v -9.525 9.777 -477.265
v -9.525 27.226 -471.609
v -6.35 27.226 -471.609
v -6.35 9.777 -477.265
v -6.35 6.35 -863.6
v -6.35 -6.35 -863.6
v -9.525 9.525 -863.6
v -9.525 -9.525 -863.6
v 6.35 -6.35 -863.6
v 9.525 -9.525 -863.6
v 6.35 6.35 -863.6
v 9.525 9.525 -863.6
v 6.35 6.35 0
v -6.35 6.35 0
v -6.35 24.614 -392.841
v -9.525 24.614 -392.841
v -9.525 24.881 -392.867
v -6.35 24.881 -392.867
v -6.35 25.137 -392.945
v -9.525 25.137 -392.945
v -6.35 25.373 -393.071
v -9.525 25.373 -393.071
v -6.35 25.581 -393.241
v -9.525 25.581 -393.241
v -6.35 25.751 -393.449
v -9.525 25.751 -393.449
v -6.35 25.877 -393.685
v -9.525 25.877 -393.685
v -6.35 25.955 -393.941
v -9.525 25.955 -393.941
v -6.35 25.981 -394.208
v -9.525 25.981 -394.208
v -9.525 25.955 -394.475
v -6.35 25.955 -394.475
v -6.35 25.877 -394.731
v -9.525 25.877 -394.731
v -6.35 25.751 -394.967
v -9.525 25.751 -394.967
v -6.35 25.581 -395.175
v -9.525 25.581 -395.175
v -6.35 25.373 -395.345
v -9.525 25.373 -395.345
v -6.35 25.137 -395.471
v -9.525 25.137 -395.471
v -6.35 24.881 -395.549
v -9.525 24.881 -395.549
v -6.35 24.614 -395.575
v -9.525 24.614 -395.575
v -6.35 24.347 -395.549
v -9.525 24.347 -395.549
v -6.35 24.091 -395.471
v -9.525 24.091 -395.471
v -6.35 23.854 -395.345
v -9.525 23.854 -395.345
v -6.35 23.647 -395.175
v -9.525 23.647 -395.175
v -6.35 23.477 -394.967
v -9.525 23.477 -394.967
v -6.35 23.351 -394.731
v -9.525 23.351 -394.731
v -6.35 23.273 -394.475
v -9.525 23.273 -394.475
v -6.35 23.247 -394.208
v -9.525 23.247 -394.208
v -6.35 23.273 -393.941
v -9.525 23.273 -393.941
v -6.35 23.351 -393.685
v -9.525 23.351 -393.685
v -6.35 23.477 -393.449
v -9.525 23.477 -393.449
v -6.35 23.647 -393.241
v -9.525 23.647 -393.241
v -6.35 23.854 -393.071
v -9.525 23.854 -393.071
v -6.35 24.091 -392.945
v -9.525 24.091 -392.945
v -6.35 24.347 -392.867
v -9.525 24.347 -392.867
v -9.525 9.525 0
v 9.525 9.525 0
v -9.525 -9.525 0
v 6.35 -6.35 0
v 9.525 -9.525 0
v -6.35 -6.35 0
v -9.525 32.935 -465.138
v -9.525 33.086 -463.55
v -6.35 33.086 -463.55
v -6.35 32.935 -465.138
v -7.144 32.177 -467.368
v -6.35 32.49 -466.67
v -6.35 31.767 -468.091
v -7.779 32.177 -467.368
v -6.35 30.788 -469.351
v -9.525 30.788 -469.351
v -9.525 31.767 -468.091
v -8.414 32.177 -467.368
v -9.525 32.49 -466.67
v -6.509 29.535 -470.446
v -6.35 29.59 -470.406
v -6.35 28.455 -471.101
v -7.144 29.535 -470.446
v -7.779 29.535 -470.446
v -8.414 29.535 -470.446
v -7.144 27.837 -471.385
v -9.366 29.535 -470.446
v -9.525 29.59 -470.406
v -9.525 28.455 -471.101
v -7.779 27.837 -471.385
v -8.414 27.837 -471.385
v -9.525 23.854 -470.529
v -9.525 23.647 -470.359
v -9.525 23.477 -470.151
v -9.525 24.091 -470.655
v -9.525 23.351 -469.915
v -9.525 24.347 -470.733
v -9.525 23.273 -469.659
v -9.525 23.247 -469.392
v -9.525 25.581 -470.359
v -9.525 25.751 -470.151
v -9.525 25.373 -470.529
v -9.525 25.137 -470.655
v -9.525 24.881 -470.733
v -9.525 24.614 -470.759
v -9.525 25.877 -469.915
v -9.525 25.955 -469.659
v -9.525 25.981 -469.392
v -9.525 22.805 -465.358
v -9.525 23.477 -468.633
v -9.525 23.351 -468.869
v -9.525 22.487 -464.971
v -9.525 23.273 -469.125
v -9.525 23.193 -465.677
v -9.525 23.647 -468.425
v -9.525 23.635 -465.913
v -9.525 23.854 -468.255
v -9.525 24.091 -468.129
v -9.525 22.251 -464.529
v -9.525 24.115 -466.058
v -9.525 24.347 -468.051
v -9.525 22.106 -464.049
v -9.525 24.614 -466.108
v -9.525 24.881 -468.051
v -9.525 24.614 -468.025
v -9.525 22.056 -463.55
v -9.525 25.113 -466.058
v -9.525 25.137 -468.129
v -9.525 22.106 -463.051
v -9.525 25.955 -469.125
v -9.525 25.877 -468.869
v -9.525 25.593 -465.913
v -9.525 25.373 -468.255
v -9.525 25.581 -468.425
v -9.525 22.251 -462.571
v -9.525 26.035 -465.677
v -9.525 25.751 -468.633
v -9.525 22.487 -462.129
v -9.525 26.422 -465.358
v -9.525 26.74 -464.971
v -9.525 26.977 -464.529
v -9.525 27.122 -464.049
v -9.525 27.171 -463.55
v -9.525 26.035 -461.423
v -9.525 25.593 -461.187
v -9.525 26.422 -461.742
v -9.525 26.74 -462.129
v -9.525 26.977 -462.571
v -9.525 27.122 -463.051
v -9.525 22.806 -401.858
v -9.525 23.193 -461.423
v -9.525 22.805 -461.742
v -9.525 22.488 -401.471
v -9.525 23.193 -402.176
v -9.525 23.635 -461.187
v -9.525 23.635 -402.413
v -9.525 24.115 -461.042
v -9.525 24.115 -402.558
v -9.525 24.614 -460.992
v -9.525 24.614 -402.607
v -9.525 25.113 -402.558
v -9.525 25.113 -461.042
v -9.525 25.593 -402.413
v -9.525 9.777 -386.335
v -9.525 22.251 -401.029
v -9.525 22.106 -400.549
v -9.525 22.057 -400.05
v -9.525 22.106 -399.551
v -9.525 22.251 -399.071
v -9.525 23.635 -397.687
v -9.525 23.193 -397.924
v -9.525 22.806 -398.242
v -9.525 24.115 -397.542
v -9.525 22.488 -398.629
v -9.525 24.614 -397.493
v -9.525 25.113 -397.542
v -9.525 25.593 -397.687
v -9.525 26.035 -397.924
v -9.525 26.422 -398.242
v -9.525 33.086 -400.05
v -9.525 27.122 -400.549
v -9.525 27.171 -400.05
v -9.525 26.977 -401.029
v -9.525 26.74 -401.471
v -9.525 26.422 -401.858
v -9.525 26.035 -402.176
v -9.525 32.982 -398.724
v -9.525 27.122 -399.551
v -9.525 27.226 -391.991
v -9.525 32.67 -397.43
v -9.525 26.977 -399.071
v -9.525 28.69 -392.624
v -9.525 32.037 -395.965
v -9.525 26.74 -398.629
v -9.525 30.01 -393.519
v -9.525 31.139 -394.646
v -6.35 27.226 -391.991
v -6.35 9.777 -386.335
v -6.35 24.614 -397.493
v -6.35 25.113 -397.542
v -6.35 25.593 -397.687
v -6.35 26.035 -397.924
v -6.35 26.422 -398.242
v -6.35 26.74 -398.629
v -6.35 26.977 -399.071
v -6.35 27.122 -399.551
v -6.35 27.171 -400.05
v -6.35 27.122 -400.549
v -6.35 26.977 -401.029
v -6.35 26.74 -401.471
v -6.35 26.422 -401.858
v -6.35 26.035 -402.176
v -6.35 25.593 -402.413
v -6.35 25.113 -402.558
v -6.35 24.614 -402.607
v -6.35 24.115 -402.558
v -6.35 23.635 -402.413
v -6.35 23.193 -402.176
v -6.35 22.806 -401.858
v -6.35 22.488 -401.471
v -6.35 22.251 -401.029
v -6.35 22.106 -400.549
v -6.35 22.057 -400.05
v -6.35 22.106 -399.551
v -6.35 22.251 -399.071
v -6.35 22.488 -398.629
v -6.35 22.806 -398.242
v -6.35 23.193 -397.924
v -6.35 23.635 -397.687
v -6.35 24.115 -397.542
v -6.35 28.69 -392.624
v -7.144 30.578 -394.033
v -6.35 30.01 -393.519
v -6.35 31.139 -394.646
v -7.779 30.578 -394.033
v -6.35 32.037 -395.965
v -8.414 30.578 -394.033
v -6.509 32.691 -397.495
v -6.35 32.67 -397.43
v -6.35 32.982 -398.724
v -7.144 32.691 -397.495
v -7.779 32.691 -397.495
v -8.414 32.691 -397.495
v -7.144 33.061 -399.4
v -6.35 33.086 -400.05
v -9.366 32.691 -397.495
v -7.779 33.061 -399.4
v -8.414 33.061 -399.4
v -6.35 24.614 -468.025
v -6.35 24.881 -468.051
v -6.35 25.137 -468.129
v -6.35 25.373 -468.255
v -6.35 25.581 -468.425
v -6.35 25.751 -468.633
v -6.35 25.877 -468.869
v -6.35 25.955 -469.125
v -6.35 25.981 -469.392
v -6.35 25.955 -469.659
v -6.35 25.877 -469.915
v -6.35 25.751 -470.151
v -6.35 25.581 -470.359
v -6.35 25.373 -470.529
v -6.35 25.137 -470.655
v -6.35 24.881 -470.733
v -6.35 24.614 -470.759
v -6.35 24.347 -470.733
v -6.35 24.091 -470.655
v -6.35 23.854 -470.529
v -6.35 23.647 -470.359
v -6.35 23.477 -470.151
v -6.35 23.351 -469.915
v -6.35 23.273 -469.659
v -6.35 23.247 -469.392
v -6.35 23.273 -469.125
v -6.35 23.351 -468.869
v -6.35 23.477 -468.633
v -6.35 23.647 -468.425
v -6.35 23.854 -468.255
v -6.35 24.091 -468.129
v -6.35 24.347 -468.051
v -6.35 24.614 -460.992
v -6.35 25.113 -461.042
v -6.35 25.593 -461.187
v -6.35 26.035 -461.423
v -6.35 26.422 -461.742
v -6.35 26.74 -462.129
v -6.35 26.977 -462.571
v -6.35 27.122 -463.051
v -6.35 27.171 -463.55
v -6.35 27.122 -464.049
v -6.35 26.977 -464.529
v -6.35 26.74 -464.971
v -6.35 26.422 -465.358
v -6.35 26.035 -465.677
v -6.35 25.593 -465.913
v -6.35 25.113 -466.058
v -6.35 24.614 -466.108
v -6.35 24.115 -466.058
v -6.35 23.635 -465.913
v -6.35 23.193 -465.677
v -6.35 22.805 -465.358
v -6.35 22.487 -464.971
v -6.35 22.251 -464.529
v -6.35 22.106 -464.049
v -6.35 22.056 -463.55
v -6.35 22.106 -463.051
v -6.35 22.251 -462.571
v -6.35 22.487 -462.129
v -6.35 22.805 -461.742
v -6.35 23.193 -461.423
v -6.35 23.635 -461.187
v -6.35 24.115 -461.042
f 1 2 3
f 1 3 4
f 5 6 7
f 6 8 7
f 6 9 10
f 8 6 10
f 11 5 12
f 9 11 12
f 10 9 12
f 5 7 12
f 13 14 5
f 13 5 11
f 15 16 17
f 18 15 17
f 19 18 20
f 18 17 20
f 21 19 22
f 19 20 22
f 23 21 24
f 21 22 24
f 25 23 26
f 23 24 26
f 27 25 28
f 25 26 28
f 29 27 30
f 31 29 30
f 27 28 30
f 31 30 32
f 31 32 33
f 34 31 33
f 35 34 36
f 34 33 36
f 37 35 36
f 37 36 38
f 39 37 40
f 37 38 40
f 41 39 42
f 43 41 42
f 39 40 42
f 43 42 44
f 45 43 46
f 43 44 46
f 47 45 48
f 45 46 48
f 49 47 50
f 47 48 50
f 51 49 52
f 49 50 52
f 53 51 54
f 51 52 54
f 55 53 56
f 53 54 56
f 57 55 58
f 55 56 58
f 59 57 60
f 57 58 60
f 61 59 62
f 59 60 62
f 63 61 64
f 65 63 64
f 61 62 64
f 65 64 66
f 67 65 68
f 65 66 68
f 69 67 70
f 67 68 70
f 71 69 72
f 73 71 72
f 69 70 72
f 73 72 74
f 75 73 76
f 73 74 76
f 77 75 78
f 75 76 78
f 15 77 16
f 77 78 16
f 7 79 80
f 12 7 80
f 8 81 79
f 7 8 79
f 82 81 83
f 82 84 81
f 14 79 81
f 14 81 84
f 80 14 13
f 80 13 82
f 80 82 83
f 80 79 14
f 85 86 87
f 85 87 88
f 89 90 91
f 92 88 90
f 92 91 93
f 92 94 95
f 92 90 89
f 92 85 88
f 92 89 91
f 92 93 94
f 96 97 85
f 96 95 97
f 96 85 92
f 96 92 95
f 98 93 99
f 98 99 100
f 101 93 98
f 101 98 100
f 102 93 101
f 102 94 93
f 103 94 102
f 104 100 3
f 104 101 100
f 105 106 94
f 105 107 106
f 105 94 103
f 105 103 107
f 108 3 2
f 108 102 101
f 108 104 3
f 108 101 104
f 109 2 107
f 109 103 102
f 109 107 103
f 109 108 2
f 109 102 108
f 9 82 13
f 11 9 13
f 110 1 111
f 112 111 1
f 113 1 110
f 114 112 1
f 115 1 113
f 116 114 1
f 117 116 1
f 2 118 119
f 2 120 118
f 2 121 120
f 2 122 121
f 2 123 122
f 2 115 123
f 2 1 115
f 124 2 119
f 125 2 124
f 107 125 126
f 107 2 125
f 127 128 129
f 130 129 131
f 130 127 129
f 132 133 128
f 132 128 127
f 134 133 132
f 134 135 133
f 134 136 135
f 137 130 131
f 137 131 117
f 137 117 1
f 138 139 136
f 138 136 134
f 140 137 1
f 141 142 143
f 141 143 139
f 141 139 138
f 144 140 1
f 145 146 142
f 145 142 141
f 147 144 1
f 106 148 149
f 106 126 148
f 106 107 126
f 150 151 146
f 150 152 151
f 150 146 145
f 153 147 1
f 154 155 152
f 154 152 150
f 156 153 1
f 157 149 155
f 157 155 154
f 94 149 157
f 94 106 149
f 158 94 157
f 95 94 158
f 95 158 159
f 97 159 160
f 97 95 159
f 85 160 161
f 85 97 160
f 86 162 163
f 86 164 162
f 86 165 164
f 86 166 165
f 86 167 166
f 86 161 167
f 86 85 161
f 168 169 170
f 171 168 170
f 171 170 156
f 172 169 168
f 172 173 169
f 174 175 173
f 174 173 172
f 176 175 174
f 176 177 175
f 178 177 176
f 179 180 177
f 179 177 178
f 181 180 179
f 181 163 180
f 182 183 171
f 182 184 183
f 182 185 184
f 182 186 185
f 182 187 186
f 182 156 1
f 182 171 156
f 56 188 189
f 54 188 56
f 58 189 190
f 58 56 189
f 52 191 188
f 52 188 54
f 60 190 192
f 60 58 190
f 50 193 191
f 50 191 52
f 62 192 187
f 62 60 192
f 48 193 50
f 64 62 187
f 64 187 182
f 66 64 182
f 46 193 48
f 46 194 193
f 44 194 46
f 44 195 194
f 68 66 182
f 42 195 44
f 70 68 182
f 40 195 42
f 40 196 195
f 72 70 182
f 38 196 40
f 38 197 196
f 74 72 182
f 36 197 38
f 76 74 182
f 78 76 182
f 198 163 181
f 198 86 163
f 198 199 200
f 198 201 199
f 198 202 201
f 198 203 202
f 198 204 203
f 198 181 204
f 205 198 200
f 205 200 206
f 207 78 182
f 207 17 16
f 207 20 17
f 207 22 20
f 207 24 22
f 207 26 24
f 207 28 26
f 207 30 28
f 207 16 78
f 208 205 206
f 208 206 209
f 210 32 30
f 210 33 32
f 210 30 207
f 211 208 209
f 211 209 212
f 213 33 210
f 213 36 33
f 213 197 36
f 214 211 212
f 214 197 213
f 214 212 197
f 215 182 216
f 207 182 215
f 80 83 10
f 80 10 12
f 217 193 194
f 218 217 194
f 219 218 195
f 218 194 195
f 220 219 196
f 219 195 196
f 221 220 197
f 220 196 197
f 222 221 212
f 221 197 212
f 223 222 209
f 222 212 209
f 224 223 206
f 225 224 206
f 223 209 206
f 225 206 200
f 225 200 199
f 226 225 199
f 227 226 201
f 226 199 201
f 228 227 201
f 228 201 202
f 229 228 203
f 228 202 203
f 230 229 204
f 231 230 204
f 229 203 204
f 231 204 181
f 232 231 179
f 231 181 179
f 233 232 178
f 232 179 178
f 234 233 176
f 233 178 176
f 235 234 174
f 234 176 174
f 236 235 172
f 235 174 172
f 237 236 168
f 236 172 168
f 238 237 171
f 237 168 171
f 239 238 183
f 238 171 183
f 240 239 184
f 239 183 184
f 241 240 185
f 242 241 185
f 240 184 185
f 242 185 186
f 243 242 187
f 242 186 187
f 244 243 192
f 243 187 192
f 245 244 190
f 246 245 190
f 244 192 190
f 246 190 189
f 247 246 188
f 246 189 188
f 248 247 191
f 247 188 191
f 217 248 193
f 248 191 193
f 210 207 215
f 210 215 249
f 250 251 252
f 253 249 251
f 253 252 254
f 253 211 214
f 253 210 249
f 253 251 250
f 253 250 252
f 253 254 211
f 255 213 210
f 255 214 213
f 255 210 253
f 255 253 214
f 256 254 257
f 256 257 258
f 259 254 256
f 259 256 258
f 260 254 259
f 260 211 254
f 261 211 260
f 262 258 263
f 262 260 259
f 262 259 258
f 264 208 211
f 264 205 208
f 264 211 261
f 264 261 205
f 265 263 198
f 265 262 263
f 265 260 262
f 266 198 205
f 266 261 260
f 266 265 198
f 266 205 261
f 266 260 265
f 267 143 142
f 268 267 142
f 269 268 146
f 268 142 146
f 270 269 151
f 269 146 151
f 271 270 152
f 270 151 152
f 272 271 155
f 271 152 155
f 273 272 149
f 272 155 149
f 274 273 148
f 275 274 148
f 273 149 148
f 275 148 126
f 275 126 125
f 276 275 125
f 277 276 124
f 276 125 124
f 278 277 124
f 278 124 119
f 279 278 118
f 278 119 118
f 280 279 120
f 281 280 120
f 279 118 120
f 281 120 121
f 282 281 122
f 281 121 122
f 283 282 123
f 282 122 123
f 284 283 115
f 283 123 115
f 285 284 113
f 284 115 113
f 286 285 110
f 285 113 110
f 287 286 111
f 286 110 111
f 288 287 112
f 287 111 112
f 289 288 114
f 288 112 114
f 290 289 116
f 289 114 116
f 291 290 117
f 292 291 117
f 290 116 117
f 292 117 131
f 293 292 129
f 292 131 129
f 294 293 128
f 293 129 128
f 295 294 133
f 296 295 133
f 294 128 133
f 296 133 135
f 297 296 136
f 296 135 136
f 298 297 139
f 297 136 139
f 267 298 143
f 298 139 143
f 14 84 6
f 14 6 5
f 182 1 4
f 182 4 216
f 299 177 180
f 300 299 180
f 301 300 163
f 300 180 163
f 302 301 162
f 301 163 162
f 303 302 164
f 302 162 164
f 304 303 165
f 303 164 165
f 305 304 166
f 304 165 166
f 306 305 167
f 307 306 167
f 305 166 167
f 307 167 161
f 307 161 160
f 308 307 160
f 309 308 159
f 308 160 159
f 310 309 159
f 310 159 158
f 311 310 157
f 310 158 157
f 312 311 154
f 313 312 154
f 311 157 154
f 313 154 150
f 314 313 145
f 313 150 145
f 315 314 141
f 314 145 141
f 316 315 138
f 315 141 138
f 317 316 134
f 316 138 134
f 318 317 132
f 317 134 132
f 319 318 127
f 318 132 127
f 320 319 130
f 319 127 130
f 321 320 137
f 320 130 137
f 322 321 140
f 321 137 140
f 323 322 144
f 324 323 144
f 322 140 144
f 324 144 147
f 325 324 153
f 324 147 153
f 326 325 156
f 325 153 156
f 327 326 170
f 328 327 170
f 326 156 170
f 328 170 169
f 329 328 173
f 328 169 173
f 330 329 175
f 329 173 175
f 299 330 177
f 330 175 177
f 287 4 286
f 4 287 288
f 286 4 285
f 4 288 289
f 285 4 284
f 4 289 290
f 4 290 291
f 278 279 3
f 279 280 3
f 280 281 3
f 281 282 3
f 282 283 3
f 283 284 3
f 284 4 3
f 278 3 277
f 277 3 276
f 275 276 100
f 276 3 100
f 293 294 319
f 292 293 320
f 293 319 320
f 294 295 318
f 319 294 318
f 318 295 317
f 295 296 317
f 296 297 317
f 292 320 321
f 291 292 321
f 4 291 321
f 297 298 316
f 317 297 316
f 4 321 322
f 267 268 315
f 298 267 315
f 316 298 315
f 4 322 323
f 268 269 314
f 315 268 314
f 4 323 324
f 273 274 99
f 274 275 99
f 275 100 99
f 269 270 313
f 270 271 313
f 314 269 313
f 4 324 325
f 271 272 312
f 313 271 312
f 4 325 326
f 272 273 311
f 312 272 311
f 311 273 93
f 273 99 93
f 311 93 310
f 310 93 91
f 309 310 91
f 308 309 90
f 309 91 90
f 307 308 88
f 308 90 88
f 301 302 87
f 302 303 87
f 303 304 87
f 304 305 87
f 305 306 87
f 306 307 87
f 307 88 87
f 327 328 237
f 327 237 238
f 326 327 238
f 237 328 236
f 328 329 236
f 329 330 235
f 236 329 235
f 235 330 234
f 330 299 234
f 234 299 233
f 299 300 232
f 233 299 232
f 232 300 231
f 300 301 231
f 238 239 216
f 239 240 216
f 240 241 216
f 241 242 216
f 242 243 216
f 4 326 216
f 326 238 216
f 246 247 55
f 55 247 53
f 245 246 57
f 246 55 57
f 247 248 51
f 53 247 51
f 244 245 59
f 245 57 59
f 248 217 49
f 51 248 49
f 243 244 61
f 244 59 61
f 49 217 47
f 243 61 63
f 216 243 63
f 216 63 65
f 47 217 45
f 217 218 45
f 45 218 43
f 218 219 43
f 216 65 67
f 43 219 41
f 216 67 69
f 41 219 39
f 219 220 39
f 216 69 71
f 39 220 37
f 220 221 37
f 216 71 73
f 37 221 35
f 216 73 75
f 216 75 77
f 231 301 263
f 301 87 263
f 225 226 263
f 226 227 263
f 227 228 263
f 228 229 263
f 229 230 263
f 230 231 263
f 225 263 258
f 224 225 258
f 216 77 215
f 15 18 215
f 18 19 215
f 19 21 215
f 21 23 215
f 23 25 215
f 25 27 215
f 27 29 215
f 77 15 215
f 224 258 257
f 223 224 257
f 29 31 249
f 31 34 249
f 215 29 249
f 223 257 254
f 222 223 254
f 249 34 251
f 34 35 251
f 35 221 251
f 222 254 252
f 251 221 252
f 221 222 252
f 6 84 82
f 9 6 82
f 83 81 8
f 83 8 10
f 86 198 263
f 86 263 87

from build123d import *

# Parameters (mm, degrees)
SKETCH1_W           = 19.05
SKETCH1_H           = 19.05
BOSS_EXTRUDE1_DEPTH = 863.6
CUT_EXTRUDE1_REACH  = 865.6
SKETCH2_W           = 12.7
SKETCH2_H           = 12.7
BOSS_EXTRUDE2_DEPTH = 3.175
SKETCH5_R           = 1.367056659
SKETCH5_R_2         = 2.557242264
SKETCH5_R_3         = 2.557551724
CUT_EXTRUDE2_DEPTH  = 3.175


with BuildPart() as part:
    # Sketch1 → Boss-Extrude1 (new body)
    with BuildSketch(Plane.XY):
        Rectangle(SKETCH1_W, SKETCH1_H)
    extrude(amount=-BOSS_EXTRUDE1_DEPTH)

    # Sketch2 → Cut-Extrude1 (cut, up to next)
    with BuildSketch(Plane.XY, mode=Mode.PRIVATE) as cut_extrude1_sk1:
        Rectangle(SKETCH2_W, SKETCH2_H)
    cut_extrude1_tool1 = extrude(cut_extrude1_sk1.sketch, amount=-CUT_EXTRUDE1_REACH, mode=Mode.PRIVATE) & part.part
    add(cut_extrude1_tool1.solids().sort_by_distance((0, 0, 0))[0], mode=Mode.SUBTRACT)


with BuildPart() as body_2:
    # Sketch3 → Boss-Extrude2 (new body)
    with BuildSketch(Plane.ZY.offset(9.525)):
        with BuildLine():
            Line((-400.05, 33.085539952), (-463.55, 33.085539952))
            add(Edge.make_bspline(
                [(-463.55, 33.085539952), (-463.646128521, 33.084595214), (-463.838385563, 33.082705738), (-464.126436973, 33.067428476), (-464.413820455, 33.043060852), (-464.700203047, 33.0087375), (-465.080269374, 32.950070985), (-465.457006855, 32.872028355), (-465.829116116, 32.774907208), (-466.231406358, 32.655132939), (-466.750263355, 32.467816052), (-467.372247923, 32.185361594), (-467.969578868, 31.853591769), (-468.537542338, 31.472566802), (-469.07395459, 31.049637904), (-469.740655492, 30.429656969), (-470.460548641, 29.57349801), (-470.95574341, 28.755452697), (-471.240535683, 28.173623773), (-471.382062435, 27.852802616), (-471.514169404, 27.509958219), (-471.582805089, 27.304132504), (-471.608786902, 27.226217855)],
                knots=[0, 0, 0, 0, 0.027082523, 0.054165045, 0.081247568, 0.108330091, 0.135412613, 0.189577659, 0.216660181, 0.243742704, 0.307821112, 0.371897307, 0.436011013, 0.500107189, 0.564389201, 0.62826361, 0.756365308, 0.878115553, 0.896531504, 0.938874057, 0.976860975, 1, 1, 1, 1], degree=3))
            Line((-471.608786902, 27.226217855), (-477.264861875, 9.777442657))
            Line((-477.264861875, 9.777442657), (-386.335138125, 9.777442657))
            Line((-386.335138125, 9.777442657), (-391.991213098, 27.226217855))
            add(Edge.make_bspline(
                [(-391.991213098, 27.226217855), (-392.021753734, 27.317370774), (-392.082835007, 27.499676612), (-392.186190582, 27.768980594), (-392.297987591, 28.034846115), (-392.41894656, 28.296689598), (-392.591950531, 28.64014527), (-392.782359956, 28.974459542), (-392.989491068, 29.298488124), (-393.227477956, 29.644241729), (-393.565660364, 30.080054599), (-394.026144491, 30.584633328), (-394.525938749, 31.050553035), (-395.063532301, 31.473348142), (-395.631258779, 31.853208118), (-396.426610529, 32.296245416), (-397.463033709, 32.717055707), (-398.393913099, 32.935869659), (-399.035207635, 33.027372958), (-399.384036197, 33.063075641), (-399.75091015, 33.083026532), (-399.967870418, 33.084849771), (-400.05, 33.085539952)],
                knots=[0, 0, 0, 0, 0.027082523, 0.054165045, 0.081247568, 0.108330091, 0.135412613, 0.189577659, 0.216660181, 0.243742704, 0.307821112, 0.371897307, 0.436011013, 0.500107189, 0.564389201, 0.62826361, 0.756365308, 0.878115553, 0.896531502, 0.938874057, 0.976860979, 1, 1, 1, 1], degree=3))
        make_face()
    extrude(amount=-BOSS_EXTRUDE2_DEPTH)

    # Sketch5 → Cut-Extrude2 (cut)
    with BuildSketch(Plane.ZY.offset(9.525)):
        with Locations((-394.208, 24.613936913)):
            Circle(SKETCH5_R)
        with Locations((-469.392, 24.613936913)):
            Circle(SKETCH5_R)
        with Locations((-400.05, 24.613936913)):
            Circle(SKETCH5_R_2)
        with Locations((-463.55, 24.613936913)):
            Circle(SKETCH5_R_3)
    extrude(amount=-CUT_EXTRUDE2_DEPTH, mode=Mode.SUBTRACT)


solid = Compound([part.part, body_2.part])
